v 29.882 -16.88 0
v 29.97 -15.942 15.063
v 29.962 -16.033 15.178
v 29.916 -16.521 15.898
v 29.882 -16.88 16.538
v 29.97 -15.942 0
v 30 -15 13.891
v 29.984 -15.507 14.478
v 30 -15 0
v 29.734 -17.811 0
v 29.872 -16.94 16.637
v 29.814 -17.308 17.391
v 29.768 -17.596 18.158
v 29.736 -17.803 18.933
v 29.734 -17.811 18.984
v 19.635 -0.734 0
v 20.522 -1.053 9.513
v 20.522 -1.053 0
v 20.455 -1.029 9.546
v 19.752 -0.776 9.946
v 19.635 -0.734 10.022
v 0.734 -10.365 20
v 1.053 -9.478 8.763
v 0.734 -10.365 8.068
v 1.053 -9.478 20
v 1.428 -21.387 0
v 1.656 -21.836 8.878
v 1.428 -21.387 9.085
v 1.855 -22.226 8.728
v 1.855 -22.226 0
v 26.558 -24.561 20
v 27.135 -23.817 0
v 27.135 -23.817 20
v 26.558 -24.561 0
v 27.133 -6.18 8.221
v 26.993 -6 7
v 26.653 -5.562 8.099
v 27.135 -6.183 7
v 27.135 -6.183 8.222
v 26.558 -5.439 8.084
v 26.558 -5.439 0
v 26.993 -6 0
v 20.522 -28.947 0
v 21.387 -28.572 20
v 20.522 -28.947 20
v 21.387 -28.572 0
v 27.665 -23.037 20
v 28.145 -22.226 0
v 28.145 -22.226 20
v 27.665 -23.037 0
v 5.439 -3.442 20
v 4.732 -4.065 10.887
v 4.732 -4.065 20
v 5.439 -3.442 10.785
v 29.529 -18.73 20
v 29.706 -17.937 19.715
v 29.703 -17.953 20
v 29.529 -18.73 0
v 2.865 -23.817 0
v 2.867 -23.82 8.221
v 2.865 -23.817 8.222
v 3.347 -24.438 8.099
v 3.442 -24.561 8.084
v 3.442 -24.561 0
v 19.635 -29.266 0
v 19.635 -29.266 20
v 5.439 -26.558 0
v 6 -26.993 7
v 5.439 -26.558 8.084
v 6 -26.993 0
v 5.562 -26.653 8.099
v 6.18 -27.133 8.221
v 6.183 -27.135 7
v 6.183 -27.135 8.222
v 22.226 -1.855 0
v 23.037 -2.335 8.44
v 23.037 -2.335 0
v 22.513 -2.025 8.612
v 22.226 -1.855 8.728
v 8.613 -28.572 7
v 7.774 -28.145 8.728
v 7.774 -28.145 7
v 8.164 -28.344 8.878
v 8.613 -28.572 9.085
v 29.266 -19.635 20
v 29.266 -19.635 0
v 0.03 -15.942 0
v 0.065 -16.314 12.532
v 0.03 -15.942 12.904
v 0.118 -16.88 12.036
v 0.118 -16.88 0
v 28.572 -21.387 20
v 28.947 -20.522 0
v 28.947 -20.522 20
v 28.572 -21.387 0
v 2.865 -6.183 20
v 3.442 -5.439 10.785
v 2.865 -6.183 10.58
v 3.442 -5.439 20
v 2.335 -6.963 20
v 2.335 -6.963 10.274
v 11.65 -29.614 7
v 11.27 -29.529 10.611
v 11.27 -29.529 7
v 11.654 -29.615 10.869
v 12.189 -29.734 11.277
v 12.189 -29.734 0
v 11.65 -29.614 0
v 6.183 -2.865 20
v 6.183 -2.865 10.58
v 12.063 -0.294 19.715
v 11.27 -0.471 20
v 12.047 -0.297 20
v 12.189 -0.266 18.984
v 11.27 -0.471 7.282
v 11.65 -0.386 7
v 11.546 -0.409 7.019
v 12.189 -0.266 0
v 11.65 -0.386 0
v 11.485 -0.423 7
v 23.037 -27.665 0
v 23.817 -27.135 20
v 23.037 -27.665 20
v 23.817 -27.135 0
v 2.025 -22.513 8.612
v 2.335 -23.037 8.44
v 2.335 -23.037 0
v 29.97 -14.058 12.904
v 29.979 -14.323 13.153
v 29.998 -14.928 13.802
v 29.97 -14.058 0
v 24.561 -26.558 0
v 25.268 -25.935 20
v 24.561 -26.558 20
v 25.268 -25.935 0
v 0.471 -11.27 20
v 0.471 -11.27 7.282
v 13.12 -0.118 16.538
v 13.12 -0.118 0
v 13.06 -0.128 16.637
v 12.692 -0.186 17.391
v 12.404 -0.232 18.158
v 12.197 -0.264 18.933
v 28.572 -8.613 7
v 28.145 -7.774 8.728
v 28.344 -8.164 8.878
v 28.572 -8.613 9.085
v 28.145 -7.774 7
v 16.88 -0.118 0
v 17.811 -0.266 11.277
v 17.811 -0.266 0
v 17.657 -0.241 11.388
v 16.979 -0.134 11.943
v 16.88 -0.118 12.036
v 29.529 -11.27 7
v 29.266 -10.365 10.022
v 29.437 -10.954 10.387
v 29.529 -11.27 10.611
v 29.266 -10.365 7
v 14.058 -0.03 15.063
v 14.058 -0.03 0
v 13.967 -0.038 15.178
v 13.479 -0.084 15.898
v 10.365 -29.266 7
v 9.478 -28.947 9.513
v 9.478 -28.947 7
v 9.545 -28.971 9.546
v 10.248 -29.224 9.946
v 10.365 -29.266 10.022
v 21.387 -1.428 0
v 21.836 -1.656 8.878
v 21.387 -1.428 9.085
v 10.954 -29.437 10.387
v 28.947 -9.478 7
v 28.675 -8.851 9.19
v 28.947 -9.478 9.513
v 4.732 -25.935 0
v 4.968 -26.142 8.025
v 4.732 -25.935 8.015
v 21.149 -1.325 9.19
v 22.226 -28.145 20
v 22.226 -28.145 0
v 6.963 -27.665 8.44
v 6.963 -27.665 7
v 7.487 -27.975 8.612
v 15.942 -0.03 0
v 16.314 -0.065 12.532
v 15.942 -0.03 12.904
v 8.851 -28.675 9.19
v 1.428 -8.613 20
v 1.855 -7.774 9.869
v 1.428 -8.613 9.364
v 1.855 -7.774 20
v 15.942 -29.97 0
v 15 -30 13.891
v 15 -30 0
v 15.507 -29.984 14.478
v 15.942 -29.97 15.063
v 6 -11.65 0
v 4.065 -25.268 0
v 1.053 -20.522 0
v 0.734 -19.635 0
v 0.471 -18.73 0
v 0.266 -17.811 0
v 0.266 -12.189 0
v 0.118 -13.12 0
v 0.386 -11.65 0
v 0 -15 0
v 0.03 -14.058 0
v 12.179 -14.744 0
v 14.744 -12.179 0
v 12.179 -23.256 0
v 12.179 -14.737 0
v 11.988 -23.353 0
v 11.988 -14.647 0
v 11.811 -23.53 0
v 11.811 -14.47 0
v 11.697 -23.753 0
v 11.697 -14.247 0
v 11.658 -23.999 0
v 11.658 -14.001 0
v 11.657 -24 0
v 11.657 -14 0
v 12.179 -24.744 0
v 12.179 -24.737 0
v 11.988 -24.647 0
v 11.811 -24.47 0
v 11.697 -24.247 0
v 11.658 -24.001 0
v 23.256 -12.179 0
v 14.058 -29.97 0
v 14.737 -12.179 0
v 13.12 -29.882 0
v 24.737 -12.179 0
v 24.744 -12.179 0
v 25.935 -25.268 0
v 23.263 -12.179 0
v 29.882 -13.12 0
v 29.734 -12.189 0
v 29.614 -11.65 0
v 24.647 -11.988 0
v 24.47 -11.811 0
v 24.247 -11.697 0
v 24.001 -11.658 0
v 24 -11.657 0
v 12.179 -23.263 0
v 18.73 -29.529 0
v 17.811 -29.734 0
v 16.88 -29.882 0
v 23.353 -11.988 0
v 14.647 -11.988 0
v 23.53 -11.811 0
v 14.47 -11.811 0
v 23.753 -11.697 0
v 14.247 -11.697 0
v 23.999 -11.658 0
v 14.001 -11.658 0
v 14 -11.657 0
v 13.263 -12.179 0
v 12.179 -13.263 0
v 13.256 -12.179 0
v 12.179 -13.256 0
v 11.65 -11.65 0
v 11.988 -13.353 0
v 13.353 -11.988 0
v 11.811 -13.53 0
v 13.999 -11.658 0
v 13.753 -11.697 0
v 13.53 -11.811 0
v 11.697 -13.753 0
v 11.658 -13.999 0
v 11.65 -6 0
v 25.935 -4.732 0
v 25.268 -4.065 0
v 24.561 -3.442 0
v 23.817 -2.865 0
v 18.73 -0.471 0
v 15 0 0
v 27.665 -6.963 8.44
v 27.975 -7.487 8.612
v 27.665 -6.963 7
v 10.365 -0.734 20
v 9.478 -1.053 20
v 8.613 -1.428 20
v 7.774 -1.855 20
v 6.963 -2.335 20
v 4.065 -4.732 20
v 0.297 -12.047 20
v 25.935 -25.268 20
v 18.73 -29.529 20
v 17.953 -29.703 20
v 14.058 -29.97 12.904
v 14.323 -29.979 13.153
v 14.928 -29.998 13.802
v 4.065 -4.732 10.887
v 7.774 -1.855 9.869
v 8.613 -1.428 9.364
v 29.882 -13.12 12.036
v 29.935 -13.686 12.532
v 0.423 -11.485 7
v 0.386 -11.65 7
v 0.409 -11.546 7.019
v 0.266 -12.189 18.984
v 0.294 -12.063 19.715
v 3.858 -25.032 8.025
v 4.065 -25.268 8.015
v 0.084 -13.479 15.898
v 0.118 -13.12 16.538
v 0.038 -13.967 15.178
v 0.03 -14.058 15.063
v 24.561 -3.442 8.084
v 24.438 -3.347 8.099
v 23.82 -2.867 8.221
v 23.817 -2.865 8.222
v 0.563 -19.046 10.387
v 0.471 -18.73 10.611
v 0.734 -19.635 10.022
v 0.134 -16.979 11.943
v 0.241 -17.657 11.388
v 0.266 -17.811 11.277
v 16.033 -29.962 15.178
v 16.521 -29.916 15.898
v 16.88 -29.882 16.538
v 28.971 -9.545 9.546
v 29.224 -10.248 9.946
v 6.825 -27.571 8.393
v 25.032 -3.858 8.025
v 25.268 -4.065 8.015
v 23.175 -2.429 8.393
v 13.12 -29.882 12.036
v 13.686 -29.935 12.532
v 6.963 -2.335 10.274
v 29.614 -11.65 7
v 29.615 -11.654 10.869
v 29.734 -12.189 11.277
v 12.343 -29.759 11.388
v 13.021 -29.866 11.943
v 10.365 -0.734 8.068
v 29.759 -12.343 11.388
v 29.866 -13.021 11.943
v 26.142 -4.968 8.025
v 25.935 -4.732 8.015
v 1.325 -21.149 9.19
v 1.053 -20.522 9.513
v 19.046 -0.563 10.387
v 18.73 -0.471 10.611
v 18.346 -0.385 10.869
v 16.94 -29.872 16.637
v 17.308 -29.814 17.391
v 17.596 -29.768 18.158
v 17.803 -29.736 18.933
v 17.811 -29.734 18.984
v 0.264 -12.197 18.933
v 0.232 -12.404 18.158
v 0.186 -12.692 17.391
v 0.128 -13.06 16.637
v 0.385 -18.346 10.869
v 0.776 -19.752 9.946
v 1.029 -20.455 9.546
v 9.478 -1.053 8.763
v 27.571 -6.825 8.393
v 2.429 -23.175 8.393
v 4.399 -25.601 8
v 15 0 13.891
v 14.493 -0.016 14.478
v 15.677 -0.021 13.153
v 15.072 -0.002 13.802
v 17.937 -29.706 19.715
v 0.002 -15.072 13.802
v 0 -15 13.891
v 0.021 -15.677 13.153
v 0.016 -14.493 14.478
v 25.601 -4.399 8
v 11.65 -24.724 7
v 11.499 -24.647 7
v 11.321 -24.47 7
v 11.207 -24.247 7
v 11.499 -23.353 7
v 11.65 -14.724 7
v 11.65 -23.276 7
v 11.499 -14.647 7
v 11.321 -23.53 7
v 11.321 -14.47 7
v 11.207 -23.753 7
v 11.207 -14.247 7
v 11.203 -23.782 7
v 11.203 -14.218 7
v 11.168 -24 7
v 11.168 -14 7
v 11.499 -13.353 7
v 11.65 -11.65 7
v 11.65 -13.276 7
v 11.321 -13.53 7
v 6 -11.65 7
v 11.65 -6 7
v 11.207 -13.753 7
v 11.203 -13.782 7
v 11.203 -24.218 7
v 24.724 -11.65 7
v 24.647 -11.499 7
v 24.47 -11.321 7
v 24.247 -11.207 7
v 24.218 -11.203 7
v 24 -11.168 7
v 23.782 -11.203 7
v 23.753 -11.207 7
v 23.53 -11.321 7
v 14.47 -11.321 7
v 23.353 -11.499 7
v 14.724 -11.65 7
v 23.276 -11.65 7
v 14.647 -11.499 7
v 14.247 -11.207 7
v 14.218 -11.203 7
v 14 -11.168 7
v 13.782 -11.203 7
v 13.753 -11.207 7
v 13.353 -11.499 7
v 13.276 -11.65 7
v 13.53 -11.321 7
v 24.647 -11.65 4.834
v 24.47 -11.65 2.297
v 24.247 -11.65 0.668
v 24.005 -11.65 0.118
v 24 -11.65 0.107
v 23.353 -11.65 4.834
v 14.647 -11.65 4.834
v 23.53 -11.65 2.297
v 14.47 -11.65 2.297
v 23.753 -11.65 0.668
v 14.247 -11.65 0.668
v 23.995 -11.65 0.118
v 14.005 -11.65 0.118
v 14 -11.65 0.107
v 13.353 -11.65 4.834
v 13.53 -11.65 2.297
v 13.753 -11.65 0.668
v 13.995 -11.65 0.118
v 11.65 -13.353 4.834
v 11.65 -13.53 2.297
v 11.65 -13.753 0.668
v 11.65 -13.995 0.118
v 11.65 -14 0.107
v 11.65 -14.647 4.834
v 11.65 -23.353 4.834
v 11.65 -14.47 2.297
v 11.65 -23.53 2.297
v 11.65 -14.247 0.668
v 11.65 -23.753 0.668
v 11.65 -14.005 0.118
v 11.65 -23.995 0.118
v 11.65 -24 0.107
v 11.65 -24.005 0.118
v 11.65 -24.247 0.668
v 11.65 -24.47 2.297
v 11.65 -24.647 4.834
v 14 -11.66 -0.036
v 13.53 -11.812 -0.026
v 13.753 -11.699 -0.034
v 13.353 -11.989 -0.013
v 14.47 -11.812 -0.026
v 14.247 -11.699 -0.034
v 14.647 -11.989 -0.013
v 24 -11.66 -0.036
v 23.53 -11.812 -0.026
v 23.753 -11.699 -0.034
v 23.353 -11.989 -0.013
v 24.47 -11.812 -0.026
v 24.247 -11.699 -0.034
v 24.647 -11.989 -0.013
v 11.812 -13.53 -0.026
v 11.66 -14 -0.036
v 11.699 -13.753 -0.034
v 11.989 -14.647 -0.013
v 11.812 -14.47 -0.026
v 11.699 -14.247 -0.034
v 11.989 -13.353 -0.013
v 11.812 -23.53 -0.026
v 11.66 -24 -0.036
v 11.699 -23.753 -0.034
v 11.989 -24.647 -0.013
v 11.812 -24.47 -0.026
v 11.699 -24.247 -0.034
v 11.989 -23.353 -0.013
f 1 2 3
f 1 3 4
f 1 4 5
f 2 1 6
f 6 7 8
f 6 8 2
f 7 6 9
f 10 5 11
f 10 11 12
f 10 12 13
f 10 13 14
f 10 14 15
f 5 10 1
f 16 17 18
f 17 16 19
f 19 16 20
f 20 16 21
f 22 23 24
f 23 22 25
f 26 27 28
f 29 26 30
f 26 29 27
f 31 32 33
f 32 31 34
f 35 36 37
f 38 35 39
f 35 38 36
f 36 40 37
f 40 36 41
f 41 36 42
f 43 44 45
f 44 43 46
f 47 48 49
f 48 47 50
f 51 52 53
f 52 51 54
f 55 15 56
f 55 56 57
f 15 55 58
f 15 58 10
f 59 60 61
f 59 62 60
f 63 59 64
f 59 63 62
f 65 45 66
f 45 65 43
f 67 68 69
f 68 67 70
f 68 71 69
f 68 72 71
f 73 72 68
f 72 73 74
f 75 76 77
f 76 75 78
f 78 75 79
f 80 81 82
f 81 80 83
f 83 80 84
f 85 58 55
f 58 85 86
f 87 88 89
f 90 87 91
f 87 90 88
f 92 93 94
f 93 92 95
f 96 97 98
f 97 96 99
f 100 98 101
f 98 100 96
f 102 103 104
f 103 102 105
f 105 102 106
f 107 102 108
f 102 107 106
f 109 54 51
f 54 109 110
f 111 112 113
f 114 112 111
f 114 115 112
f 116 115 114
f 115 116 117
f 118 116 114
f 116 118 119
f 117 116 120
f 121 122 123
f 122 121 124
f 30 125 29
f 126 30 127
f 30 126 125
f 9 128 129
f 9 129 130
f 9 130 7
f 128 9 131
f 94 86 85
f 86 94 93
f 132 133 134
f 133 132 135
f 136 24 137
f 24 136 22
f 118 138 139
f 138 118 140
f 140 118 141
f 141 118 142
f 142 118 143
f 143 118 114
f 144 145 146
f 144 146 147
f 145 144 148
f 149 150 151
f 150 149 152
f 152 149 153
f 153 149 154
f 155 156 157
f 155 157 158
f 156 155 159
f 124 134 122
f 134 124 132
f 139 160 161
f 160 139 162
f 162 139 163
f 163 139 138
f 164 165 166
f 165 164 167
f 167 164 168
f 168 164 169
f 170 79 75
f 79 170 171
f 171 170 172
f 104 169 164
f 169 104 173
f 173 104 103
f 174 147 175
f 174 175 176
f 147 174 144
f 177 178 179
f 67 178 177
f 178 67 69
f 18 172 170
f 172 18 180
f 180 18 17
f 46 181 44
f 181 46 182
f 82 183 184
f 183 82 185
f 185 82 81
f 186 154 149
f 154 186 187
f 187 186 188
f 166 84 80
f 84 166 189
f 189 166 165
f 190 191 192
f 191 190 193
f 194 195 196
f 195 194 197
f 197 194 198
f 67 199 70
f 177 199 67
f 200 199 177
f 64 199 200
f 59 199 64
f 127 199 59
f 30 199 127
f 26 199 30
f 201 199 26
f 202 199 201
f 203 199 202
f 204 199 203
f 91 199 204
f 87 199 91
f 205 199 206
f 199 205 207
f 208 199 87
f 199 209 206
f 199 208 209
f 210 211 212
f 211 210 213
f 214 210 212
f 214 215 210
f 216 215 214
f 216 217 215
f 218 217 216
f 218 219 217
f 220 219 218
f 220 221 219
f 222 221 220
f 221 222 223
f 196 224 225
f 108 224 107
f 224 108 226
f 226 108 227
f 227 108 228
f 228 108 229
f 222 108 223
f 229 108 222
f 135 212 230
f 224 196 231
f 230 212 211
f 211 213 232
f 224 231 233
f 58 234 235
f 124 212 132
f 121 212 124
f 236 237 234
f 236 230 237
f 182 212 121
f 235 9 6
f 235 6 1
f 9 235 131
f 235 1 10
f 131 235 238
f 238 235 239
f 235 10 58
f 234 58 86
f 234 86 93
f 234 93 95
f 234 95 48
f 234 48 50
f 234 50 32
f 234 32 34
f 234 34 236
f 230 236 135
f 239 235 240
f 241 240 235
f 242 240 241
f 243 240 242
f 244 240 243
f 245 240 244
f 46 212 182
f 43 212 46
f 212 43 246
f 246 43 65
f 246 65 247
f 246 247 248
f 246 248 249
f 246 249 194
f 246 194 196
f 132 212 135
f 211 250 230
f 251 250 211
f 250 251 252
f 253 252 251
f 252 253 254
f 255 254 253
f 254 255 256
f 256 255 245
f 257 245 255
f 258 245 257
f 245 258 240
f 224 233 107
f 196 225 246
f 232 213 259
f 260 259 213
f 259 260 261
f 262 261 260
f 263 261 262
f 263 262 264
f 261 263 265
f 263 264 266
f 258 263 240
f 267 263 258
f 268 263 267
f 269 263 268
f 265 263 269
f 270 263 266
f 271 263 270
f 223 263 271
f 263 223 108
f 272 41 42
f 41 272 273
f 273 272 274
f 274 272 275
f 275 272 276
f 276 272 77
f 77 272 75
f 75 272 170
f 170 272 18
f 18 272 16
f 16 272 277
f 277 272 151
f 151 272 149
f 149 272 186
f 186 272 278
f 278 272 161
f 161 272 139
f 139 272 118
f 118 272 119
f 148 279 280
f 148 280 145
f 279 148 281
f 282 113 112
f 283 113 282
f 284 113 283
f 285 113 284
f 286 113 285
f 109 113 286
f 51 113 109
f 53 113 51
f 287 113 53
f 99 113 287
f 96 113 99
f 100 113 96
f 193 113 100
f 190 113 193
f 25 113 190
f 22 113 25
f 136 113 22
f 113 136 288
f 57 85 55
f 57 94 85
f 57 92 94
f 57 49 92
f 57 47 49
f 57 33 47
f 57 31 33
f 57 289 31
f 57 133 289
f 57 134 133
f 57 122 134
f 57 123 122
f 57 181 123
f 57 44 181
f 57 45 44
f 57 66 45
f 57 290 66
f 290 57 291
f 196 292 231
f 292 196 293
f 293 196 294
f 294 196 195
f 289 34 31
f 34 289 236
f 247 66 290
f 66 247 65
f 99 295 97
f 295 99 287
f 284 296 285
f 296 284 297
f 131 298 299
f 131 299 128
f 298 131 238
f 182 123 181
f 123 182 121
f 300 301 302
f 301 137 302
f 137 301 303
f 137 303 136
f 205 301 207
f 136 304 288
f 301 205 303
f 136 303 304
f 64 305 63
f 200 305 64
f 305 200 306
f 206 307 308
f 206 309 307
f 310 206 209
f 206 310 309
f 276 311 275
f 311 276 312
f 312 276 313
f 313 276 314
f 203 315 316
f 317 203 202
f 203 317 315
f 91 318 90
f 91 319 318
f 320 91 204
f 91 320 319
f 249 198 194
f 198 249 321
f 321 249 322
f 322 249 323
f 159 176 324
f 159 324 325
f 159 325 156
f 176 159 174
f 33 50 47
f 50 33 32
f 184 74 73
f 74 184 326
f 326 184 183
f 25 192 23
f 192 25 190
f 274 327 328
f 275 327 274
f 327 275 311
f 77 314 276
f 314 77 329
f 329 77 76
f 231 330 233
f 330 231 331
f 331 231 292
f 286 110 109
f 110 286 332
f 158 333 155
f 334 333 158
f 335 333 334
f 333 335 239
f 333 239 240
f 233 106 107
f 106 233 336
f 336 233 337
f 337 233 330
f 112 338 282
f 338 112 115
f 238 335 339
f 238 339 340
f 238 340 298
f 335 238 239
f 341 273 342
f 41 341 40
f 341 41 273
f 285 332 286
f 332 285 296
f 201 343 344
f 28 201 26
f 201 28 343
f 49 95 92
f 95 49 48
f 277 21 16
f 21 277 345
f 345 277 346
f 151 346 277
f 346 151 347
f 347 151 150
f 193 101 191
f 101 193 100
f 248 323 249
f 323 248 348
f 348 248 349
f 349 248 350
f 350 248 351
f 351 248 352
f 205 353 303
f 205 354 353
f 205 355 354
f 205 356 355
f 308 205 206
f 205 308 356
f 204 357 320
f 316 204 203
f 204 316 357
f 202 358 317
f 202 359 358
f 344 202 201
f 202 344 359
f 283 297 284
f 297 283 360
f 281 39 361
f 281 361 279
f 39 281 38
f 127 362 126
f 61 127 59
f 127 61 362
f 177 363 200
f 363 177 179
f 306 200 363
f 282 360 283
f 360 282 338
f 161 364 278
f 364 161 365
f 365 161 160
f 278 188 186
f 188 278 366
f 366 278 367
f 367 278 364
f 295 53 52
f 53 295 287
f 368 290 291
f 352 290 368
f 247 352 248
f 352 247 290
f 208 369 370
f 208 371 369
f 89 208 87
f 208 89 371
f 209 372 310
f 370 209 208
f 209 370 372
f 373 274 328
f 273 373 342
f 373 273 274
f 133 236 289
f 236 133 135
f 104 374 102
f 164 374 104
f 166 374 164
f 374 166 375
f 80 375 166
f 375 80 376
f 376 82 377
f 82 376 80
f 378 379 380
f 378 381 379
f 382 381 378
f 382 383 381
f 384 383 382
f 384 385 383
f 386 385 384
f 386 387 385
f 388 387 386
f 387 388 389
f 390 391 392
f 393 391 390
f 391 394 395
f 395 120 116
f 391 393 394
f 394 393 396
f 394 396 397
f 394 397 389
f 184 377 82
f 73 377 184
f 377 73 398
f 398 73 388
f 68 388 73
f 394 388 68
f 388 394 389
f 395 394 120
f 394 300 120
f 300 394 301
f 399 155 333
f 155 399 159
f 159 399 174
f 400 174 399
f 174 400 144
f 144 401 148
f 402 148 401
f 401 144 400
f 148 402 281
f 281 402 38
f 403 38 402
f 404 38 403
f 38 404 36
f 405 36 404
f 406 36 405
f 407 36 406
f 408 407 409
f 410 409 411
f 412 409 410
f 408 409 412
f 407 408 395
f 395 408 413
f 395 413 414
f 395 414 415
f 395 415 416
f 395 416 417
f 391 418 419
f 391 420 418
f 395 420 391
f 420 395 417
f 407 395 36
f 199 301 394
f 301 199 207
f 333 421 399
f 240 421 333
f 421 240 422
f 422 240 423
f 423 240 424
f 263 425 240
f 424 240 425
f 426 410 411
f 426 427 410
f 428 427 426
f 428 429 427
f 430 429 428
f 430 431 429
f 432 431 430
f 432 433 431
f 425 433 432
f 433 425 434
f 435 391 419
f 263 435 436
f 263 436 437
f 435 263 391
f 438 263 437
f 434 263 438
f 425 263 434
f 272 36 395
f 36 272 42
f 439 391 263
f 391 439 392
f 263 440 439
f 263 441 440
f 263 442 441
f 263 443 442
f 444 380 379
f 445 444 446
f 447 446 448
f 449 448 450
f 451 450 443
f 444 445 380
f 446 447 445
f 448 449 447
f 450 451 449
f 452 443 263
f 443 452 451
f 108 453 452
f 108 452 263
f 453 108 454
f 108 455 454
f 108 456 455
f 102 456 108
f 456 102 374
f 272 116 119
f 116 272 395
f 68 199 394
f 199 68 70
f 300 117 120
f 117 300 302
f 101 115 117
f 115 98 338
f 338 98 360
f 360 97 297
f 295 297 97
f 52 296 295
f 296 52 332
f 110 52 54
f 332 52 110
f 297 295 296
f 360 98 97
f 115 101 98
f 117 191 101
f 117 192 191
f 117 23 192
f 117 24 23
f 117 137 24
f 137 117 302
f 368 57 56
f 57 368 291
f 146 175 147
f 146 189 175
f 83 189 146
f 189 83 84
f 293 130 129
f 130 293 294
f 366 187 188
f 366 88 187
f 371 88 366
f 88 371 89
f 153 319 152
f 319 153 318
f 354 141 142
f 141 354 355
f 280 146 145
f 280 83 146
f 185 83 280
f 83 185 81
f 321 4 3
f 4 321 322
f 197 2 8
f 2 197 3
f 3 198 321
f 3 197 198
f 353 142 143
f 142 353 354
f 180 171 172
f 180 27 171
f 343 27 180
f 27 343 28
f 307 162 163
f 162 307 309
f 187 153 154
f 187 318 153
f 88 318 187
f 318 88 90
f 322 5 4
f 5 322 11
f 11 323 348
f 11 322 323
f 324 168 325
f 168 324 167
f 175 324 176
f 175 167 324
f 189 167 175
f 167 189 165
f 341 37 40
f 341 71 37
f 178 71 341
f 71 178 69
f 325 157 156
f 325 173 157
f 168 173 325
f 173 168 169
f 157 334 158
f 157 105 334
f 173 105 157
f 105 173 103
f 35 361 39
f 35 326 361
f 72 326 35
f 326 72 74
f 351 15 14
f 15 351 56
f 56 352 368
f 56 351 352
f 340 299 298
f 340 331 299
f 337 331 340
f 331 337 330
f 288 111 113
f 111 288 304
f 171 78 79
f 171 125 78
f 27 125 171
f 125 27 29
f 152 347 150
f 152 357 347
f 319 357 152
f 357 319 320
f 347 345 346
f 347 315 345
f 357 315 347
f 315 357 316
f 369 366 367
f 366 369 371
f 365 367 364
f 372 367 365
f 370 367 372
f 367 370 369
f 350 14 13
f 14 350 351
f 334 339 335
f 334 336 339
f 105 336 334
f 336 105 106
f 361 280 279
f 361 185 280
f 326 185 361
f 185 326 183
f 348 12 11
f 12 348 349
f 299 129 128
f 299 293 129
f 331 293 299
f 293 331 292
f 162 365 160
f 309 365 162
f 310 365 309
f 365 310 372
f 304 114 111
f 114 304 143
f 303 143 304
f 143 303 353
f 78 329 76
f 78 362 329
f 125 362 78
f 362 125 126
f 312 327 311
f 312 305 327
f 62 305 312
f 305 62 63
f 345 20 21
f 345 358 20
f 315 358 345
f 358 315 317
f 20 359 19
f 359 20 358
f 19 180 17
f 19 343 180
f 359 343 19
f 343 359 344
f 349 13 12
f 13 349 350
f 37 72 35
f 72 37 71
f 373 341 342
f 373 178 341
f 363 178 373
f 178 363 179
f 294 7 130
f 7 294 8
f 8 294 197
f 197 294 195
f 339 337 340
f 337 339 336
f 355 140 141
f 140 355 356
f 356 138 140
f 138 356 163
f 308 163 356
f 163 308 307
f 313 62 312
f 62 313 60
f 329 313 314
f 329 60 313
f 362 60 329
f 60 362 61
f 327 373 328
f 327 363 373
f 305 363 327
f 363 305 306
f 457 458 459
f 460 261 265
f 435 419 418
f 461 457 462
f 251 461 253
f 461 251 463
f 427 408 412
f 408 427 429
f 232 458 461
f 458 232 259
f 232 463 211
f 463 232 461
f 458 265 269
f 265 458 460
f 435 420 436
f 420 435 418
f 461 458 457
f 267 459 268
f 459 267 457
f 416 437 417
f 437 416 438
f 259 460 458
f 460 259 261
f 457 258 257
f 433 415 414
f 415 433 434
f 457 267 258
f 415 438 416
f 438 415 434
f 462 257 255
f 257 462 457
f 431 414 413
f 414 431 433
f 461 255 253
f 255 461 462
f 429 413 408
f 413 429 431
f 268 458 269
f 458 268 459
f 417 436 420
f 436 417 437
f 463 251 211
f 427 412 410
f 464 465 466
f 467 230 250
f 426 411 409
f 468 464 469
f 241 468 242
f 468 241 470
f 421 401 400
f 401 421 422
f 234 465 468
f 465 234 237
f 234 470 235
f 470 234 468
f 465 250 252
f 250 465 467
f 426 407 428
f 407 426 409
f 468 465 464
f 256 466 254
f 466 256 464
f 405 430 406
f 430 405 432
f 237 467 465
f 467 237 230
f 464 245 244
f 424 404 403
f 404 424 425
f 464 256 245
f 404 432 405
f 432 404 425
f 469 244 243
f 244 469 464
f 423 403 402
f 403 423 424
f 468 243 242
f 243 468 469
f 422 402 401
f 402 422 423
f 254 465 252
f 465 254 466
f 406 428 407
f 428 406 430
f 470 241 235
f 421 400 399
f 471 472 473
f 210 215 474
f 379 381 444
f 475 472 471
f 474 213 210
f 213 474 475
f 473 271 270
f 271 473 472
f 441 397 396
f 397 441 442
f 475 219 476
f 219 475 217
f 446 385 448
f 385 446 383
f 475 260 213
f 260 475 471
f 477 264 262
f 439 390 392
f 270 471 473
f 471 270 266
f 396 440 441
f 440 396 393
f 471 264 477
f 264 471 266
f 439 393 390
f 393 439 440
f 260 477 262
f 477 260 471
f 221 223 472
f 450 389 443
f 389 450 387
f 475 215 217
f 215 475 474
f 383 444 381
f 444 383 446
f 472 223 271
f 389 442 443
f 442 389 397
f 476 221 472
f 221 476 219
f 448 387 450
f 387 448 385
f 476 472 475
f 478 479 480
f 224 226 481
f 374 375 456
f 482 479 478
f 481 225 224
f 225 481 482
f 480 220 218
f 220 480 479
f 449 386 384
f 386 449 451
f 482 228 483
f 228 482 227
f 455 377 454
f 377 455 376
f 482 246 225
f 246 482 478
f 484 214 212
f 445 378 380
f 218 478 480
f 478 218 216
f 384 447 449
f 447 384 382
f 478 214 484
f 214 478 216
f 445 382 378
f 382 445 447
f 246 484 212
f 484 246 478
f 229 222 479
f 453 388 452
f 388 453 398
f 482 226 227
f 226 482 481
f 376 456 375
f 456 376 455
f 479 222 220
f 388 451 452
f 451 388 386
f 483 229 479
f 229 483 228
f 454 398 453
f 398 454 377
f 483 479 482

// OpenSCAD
// -*- mode: SCAD ; c-file-style: "ellemtel" ; coding: utf-8 -*-
//
// Inner tube foot
//
// A foot to mount a Replicator/Duplicator/Bizer/&cator on a
// half-inflated bicycle inner tube.  You’ll need four.
//
// © 2017 Roland Sieker <ospalh@gmail.com>
// Based on Replicator Isolator Feet by Gary Crowell Sr. https://www.thingiverse.com/thing:42124
// © 2013 Gary Crowell Sr. <ospalh@gmail.com>
// Licence: CC-BY-SA 4.0


translate([0,0,8])
rotate([180,0,0])
{
   {
      foot();
   }
}

module foot ()
{
//  Replicator foot for gripper pad
   difference ()
   {
      translate ([ 15, 15, -12]) cylinder (h=20, r=15, $fn=100);

      translate ([-10,6,1])
         cube (size = [60,5.65,15], center = false);
      rotate ([0,0,270])
         translate ([-50,6,1])
         cube (size = [60,5.65,15], center = false);

      translate ([0,0,1])
      {
         cube (size = [10, 10,15], center = false);
      }
      translate ([-10,-36,-10])
      {
         rotate([0,30,45])
         {
            cube (size = [30, 30,30], center = false);
         }
      }
      rotate([90,0,45])
      {
         translate([15*sqrt(2), -12.5, -20])
         {
            cylinder(r=12.5, h=40,$fn=100);
         }
      }
   } // difference


// Strakes to make it grib the frame better
   translate ([14,11.9,0])
      rotate ([-4,0,0])
      cylinder (h=8, r=.8, $fn=20);

   translate ([24, 11.9,0])
      rotate ([-4,0,0])
      cylinder (h=8, r=.8, $fn=20);

   translate ([11.9,14,0])
      rotate ([0,4,0])
      cylinder (h=8, r=.8, $fn=20);

   translate ([11.9,24,0])
      rotate ([0,4,0])
      cylinder (h=8, r=.8, $fn=20);
}
